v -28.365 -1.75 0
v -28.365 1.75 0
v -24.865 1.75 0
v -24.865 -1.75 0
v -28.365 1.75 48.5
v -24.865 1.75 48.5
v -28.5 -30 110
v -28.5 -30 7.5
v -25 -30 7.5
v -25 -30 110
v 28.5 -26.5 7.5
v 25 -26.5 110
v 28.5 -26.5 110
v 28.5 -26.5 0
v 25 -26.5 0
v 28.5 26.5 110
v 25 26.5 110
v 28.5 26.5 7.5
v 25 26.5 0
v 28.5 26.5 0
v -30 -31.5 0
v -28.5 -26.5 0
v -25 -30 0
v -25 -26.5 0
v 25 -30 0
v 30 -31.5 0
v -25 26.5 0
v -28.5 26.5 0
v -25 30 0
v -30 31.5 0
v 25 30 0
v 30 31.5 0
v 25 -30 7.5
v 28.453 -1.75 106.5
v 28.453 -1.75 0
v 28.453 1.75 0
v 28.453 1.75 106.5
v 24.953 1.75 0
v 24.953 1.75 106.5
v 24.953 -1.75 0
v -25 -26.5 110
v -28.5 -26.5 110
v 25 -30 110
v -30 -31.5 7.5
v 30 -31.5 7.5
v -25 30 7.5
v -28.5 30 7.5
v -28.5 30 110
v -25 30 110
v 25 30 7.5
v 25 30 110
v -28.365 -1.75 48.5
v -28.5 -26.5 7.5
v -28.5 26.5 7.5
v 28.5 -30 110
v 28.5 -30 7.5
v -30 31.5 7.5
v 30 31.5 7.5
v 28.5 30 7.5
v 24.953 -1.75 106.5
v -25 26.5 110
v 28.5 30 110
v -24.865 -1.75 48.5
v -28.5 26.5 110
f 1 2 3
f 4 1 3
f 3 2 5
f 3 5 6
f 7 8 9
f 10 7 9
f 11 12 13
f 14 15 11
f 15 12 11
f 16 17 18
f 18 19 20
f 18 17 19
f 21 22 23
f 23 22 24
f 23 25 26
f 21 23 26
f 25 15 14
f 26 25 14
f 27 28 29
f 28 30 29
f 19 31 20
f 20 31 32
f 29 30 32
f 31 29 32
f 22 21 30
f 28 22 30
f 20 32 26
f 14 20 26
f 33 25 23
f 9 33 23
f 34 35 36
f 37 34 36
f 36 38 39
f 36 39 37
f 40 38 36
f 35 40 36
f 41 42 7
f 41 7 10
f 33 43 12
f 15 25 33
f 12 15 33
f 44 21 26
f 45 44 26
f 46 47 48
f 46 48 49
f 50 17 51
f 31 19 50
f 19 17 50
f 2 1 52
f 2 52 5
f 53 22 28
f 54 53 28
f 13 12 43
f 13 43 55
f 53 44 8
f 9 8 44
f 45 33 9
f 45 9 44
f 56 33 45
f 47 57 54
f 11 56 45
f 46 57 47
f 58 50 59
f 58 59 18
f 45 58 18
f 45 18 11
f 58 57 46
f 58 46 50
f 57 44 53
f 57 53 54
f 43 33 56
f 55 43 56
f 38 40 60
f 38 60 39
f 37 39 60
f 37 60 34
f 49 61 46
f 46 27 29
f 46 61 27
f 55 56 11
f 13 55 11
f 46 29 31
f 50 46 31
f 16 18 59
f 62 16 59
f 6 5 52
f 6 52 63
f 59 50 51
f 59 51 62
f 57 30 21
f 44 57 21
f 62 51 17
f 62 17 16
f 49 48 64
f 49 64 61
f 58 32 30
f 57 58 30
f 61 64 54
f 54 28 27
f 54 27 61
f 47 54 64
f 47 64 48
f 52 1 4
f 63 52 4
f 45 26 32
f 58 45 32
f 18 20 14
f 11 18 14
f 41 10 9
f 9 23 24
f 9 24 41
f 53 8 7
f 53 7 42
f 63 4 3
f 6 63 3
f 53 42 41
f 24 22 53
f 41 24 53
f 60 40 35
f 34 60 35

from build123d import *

# Parameters (mm, degrees)
F1_DEPTH = 7.5
F2_DEPTH = 7.5
F3_DEPTH = 7.5
F0_W     = 3.5
F0_H     = 3.5
F4_DEPTH = 110
F5_DEPTH = 110
F6_DEPTH = 48.5
F7_DEPTH = 106.5


with BuildPart() as f1:
    # F0 (on Top) → F1 (new body)
    with BuildSketch(Plane.XY):
        Polygon((28.5, -30), (30, -30), (30, 30), (28.5, 30), (28.5, 26.5), (28.5, -26.5), align=None)
    extrude(amount=F1_DEPTH)

    # F0 (on Top) → F2 (join)
    with BuildSketch(Plane.XY):
        Polygon((28.5, 30), (30, 30), (30, 31.5), (-30, 31.5), (-30, 30), (-28.5, 30), (-25, 30), (25, 30), align=None)
    extrude(amount=F2_DEPTH)

    # F0 (on Top) → F3 (join)
    with BuildSketch(Plane.XY):
        Polygon((-30, -31.5), (30, -31.5), (30, -30), (28.5, -30), (25, -30), (-25, -30), (-28.5, -30), (-30, -30), align=None)
        Polygon((-30, 30), (-30, -30), (-28.5, -30), (-28.5, -26.5), (-28.5, 26.5), (-28.5, 30), align=None)
    extrude(amount=F3_DEPTH)

    # F0 (on Top) → F4 (join)
    with BuildSketch(Plane.XY):
        with Locations((-26.75, 28.25)):
            Rectangle(F0_W, F0_H)
    extrude(amount=F4_DEPTH)

    # F0 (on Top) → F5 (join)
    with BuildSketch(Plane.XY):
        with Locations((-26.75, -28.25)):
            Rectangle(F0_W, F0_H)
        with Locations((26.75, -28.25)):
            Rectangle(F0_W, F0_H)
        with Locations((26.75, 28.25)):
            Rectangle(F0_W, F0_H)
    extrude(amount=F5_DEPTH)


with BuildPart() as f6:
    # F0 (on Top) → F6 (new body)
    with BuildSketch(Plane.XY):
        with Locations((-26.6152974218, 0)):
            Rectangle(F0_W, F0_H)
    extrude(amount=F6_DEPTH)


with BuildPart() as f7:
    # F0 (on Top) → F7 (new body)
    with BuildSketch(Plane.XY):
        with Locations((26.7027337104, 0)):
            Rectangle(F0_W, F0_H)
    extrude(amount=F7_DEPTH)


solid = Compound([f1.part, f6.part, f7.part])
